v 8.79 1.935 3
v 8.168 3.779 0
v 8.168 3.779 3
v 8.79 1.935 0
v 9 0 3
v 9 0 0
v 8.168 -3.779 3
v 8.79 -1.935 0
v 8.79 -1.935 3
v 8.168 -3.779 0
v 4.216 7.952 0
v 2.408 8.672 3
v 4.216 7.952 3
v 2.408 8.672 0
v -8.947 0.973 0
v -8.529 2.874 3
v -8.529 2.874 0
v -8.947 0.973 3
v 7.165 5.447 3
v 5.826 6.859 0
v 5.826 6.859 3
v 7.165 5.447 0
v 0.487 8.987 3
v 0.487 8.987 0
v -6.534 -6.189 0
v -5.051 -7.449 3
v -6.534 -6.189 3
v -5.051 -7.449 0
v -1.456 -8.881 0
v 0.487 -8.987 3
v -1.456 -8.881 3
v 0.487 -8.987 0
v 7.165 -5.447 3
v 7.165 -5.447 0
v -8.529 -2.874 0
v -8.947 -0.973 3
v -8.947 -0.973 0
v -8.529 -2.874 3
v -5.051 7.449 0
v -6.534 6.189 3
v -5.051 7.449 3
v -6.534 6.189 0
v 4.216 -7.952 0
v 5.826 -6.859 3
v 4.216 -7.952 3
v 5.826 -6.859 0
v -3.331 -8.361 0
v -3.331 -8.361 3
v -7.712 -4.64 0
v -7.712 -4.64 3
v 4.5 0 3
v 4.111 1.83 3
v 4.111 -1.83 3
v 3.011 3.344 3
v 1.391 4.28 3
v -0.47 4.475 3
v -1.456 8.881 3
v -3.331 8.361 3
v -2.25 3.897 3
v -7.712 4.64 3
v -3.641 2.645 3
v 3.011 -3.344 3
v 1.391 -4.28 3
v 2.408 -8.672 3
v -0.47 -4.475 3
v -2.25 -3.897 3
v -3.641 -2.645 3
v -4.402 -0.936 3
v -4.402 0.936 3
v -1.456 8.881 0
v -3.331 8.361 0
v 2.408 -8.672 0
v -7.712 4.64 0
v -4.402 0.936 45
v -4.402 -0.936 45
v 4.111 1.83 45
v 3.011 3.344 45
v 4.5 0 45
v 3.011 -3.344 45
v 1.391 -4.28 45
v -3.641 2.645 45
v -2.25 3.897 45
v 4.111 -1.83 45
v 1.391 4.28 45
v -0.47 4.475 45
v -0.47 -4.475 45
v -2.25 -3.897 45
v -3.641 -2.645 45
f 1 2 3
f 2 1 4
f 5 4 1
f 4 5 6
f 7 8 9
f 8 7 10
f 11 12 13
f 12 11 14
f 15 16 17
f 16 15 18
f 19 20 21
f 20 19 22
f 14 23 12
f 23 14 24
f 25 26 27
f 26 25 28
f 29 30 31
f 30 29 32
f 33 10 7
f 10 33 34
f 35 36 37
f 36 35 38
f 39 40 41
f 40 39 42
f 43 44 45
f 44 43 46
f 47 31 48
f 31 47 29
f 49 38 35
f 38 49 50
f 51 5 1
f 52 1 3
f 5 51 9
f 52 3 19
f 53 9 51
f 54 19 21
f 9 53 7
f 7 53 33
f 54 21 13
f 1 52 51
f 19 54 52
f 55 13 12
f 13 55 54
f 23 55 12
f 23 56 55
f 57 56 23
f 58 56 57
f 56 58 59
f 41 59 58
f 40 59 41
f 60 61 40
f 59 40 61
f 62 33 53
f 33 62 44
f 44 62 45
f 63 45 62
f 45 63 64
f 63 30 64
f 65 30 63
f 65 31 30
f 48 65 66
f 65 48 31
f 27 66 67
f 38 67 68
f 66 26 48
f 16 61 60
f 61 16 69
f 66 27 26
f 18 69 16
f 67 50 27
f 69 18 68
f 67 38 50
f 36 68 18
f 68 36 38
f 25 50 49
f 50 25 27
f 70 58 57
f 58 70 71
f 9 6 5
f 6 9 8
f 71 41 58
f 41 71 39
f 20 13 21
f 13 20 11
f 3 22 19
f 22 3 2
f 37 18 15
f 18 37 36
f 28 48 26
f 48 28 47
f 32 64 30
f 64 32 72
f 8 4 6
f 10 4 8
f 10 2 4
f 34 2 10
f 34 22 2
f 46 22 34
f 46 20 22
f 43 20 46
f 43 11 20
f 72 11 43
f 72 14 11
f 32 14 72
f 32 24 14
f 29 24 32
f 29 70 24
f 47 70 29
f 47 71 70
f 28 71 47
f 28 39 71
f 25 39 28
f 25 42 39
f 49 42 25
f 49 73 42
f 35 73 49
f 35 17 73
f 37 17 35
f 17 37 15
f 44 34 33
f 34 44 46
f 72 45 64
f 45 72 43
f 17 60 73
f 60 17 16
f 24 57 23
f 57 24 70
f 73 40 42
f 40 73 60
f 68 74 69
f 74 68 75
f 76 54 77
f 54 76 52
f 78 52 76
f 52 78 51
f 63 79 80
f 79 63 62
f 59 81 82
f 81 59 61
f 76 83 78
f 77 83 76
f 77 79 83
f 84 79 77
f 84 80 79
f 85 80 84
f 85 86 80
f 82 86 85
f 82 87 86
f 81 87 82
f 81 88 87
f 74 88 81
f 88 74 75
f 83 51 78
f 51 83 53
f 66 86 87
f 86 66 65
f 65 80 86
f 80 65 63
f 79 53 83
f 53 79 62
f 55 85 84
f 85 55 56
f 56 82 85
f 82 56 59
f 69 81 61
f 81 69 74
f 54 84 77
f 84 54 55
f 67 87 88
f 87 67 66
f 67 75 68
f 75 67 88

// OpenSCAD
// file: ../../params.scad
/*
 * Copyright (c) 2012 Haydn Vestal
 * 
 * See the file license.txt for copying permission.
 * 
 */

// GLOBAL
hole_radius = 5;
peg_radius = 4.5;

// MAGNET
mag_height = 6.4;
mag_ring_ir = 50;
mag_ring_or = 102;
mag_count = 16;

// BEARING
bearing_height = 25;
bearing_ir = 31;
bearing_or = 43;

// STATOR
stator_height = 16;
stator_inner_height = stator_height/2;
stator_count = 6;
stator_incidence = 360/stator_count;
stator_radius = 115;
stator_tab_width = 10;
stator_tab_offset = 50;
stator_wiring_gap = 25;
stator_wiring_gap_inset = stator_radius - (stator_wiring_gap + 10);
stator_outer_tab_extrude = 15;
stator_outer_tab_width = 30;
stator_notch = 15;
stator_notch_width = 5;
coil_edge = 80;
coil_block_length = 70;

// ROTOR & ROTOR CAP
rotor_height = mag_height + 2;
rotor_inner_height = 3;
rotor_radius = 105;
rotor_inner_radius = 20;
rotor_count = 8;
rotor_incidence = 360/rotor_count;
rotor_tie_hole_offset = 30;

rotor_cap_radius = 50;
rotor_cap_peg_radius = 35;
rotor_cap_inner_radius = 10;
rotor_cap_height = 10;
rotor_cap_insert_height = 10;
rotor_cap_bearing_inset = (bearing_height + rotor_inner_height) - rotor_cap_height;
rotor_plate_height = 5;
blade_holder_edge = 20;
rotor_peg_width = 12;
rotor_peg_height = (rotor_height * 2) + (rotor_cap_height * 2) + stator_height;

// ROTOR EDGE TIE
rotor_edge_tie_length = 40;
rotor_edge_tie_width = 20;
rotor_edge_tie_inner_height = 5;
rotor_edge_tie_height = rotor_height + rotor_plate_height;
rotor_edge_tie_peg_inset = 10;
// main file
/*
 * Copyright (c) 2012 Haydn Vestal
 * 
 * See the file license.txt for copying permission.
 *
 */

include <../../params.scad>


module peg() {
  cylinder(h=3, r=2*peg_radius);
  cylinder(h=45, r=peg_radius);
}

peg();
